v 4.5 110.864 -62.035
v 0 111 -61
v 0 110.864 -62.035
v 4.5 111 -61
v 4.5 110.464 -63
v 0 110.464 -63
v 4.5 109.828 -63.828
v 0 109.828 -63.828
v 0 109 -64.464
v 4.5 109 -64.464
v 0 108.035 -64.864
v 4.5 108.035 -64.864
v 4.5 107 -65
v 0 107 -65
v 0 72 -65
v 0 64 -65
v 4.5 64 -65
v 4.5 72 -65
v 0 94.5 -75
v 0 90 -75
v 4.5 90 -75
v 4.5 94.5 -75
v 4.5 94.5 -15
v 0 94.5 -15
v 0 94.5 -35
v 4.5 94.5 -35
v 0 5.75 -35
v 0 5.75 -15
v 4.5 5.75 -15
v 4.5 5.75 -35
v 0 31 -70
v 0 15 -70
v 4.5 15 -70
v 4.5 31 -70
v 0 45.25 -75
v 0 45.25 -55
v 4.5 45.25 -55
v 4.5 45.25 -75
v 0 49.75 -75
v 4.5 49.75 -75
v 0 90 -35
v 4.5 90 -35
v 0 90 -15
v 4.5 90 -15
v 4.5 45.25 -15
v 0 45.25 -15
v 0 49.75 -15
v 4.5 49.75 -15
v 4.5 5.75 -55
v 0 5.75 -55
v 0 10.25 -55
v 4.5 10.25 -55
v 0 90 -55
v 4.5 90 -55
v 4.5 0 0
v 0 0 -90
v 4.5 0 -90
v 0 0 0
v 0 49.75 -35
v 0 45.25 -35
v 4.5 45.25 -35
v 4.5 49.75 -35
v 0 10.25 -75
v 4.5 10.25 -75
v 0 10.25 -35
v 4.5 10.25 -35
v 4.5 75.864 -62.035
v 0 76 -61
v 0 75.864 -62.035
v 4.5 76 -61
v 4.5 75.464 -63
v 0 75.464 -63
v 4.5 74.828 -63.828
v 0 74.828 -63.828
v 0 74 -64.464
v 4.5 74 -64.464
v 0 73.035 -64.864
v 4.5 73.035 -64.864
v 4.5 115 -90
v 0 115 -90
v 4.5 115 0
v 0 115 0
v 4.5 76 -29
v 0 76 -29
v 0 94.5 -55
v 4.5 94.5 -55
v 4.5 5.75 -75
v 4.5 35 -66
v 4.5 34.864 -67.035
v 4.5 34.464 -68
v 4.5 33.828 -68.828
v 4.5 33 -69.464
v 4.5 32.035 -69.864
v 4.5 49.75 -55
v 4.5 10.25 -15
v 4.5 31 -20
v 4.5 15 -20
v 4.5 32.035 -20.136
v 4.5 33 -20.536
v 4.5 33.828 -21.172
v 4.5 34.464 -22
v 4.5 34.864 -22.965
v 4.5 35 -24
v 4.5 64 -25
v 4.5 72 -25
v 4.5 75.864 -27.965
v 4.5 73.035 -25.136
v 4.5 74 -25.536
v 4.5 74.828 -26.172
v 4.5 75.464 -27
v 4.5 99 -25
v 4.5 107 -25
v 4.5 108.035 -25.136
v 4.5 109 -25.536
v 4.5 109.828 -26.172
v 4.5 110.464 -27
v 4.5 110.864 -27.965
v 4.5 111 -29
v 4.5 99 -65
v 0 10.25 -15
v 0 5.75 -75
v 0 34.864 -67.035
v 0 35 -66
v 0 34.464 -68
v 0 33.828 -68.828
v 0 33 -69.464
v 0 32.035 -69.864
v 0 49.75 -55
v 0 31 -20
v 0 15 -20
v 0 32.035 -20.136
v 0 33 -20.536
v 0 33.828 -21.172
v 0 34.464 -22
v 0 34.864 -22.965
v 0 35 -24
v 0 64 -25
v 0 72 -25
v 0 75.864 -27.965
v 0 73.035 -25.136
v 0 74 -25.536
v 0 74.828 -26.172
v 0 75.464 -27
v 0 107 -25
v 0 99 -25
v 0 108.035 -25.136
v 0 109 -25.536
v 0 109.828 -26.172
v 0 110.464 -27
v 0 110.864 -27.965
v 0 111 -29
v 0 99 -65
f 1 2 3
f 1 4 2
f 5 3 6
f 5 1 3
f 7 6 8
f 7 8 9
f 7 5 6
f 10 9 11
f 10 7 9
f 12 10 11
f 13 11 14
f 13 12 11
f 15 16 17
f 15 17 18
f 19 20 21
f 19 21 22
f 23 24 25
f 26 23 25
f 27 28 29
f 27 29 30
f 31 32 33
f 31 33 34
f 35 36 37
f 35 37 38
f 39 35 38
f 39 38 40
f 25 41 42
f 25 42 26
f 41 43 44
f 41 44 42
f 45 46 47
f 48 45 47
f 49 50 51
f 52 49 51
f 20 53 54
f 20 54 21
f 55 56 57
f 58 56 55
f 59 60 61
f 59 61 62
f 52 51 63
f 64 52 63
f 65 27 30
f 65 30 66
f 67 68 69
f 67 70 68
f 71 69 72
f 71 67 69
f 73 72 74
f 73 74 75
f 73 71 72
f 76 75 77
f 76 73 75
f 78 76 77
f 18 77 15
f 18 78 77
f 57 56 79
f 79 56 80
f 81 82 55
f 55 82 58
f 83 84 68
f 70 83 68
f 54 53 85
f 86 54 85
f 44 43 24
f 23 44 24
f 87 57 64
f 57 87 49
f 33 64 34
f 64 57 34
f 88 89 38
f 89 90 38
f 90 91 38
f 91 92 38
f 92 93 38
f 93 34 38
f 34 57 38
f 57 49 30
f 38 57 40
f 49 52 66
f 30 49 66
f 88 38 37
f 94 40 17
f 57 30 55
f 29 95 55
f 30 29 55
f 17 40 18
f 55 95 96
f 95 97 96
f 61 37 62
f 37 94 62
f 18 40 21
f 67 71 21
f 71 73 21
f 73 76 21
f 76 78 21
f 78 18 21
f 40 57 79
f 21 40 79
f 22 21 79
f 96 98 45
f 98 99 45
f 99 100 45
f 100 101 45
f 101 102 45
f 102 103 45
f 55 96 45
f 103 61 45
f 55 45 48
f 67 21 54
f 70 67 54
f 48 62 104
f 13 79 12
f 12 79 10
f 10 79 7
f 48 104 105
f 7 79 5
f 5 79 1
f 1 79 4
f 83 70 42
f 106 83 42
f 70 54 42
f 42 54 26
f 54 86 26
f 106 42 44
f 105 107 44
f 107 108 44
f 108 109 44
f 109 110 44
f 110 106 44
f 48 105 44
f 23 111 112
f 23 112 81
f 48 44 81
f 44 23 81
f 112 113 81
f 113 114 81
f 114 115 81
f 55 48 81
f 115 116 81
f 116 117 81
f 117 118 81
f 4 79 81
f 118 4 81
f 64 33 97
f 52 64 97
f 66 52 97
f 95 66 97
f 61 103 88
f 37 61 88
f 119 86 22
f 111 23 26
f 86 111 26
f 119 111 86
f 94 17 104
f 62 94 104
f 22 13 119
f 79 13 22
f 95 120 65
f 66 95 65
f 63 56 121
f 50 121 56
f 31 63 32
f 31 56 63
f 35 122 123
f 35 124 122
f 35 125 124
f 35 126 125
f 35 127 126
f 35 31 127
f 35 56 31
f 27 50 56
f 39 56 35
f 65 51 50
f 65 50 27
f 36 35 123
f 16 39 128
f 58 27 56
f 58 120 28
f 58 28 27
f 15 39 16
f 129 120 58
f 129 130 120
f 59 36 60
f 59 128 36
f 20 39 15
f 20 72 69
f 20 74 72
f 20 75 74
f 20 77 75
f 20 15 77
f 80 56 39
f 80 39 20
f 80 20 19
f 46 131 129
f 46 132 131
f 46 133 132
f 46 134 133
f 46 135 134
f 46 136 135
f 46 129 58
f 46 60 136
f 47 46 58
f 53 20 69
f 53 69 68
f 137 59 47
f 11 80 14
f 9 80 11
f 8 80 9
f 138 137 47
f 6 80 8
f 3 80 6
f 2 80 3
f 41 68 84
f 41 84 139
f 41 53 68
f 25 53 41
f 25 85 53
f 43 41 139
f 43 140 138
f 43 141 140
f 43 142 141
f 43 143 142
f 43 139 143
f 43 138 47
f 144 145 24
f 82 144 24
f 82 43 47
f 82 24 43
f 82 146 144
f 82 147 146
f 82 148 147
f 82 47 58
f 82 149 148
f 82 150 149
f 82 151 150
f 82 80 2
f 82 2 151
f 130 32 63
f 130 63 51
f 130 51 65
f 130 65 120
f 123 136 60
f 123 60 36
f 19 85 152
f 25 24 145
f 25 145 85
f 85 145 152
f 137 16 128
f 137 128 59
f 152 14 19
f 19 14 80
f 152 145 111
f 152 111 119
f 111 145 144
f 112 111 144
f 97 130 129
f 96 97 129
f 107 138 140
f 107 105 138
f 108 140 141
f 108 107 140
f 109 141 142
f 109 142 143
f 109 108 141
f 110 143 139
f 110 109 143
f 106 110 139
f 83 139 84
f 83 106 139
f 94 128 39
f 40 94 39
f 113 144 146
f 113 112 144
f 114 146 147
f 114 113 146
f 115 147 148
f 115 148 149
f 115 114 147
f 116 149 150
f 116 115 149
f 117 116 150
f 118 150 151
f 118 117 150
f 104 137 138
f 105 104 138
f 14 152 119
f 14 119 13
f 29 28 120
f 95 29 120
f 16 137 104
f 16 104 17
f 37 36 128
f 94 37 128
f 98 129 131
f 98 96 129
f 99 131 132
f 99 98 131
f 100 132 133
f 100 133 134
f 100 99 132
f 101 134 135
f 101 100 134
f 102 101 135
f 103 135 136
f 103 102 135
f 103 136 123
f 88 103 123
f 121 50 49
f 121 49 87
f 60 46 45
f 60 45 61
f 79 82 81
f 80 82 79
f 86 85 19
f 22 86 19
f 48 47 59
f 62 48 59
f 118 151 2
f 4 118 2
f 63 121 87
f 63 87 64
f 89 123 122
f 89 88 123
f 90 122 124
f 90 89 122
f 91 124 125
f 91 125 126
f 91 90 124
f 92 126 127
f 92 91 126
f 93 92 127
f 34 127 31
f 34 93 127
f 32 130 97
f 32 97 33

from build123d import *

# Parameters (mm, degrees)
SKETCH1_W           = 40
SKETCH1_H           = 12
SKETCH1_W_2         = 50
SKETCH1_H_2         = 20
SKETCH1_W_3         = 20
SKETCH1_H_3         = 4.5
BOSS_EXTRUDE1_DEPTH = 4.5
FILLET1_R           = 4


with BuildPart() as part:
    # Sketch1 → Boss-Extrude1 (new body)
    with BuildSketch(Plane(origin=(0, 0, 0), x_dir=(0, 0, -1), z_dir=(1, 0, 0))):
        Polygon((0, 0), (0, 5), (0, 45), (0, 50), (0, 90), (0, 95), (0, 115), (90, 115), (90, 45), (90, 5), (90, 0), align=None)
        with Locations((45, 105)):
            Rectangle(SKETCH1_W, SKETCH1_H, mode=Mode.SUBTRACT)
        with Locations((45, 70)):
            Rectangle(SKETCH1_W, SKETCH1_H, mode=Mode.SUBTRACT)
        with Locations((45, 25)):
            Rectangle(SKETCH1_W_2, SKETCH1_H_2, mode=Mode.SUBTRACT)
        with Locations((65, 92.25)):
            Rectangle(SKETCH1_W_3, SKETCH1_H_3, mode=Mode.SUBTRACT)
        with Locations((25, 92.25)):
            Rectangle(SKETCH1_W_3, SKETCH1_H_3, mode=Mode.SUBTRACT)
        with Locations((65, 47.5)):
            Rectangle(SKETCH1_W_3, SKETCH1_H_3, mode=Mode.SUBTRACT)
        with Locations((25, 47.5)):
            Rectangle(SKETCH1_W_3, SKETCH1_H_3, mode=Mode.SUBTRACT)
        with Locations((65, 8)):
            Rectangle(SKETCH1_W_3, SKETCH1_H_3, mode=Mode.SUBTRACT)
        with Locations((25, 8)):
            Rectangle(SKETCH1_W_3, SKETCH1_H_3, mode=Mode.SUBTRACT)
    extrude(amount=BOSS_EXTRUDE1_DEPTH)

    # Fillet1
    fillet1_edges = [part.edges().sort_by_distance(p)[0] for p in [
        (2.25, 76, -65),
        (2.25, 76, -25),
        (2.25, 35, -70),
        (2.25, 35, -20),
        (2.25, 111, -65),
        (2.25, 111, -25),
    ]]
    fillet(fillet1_edges, radius=FILLET1_R)


solid = part.part
